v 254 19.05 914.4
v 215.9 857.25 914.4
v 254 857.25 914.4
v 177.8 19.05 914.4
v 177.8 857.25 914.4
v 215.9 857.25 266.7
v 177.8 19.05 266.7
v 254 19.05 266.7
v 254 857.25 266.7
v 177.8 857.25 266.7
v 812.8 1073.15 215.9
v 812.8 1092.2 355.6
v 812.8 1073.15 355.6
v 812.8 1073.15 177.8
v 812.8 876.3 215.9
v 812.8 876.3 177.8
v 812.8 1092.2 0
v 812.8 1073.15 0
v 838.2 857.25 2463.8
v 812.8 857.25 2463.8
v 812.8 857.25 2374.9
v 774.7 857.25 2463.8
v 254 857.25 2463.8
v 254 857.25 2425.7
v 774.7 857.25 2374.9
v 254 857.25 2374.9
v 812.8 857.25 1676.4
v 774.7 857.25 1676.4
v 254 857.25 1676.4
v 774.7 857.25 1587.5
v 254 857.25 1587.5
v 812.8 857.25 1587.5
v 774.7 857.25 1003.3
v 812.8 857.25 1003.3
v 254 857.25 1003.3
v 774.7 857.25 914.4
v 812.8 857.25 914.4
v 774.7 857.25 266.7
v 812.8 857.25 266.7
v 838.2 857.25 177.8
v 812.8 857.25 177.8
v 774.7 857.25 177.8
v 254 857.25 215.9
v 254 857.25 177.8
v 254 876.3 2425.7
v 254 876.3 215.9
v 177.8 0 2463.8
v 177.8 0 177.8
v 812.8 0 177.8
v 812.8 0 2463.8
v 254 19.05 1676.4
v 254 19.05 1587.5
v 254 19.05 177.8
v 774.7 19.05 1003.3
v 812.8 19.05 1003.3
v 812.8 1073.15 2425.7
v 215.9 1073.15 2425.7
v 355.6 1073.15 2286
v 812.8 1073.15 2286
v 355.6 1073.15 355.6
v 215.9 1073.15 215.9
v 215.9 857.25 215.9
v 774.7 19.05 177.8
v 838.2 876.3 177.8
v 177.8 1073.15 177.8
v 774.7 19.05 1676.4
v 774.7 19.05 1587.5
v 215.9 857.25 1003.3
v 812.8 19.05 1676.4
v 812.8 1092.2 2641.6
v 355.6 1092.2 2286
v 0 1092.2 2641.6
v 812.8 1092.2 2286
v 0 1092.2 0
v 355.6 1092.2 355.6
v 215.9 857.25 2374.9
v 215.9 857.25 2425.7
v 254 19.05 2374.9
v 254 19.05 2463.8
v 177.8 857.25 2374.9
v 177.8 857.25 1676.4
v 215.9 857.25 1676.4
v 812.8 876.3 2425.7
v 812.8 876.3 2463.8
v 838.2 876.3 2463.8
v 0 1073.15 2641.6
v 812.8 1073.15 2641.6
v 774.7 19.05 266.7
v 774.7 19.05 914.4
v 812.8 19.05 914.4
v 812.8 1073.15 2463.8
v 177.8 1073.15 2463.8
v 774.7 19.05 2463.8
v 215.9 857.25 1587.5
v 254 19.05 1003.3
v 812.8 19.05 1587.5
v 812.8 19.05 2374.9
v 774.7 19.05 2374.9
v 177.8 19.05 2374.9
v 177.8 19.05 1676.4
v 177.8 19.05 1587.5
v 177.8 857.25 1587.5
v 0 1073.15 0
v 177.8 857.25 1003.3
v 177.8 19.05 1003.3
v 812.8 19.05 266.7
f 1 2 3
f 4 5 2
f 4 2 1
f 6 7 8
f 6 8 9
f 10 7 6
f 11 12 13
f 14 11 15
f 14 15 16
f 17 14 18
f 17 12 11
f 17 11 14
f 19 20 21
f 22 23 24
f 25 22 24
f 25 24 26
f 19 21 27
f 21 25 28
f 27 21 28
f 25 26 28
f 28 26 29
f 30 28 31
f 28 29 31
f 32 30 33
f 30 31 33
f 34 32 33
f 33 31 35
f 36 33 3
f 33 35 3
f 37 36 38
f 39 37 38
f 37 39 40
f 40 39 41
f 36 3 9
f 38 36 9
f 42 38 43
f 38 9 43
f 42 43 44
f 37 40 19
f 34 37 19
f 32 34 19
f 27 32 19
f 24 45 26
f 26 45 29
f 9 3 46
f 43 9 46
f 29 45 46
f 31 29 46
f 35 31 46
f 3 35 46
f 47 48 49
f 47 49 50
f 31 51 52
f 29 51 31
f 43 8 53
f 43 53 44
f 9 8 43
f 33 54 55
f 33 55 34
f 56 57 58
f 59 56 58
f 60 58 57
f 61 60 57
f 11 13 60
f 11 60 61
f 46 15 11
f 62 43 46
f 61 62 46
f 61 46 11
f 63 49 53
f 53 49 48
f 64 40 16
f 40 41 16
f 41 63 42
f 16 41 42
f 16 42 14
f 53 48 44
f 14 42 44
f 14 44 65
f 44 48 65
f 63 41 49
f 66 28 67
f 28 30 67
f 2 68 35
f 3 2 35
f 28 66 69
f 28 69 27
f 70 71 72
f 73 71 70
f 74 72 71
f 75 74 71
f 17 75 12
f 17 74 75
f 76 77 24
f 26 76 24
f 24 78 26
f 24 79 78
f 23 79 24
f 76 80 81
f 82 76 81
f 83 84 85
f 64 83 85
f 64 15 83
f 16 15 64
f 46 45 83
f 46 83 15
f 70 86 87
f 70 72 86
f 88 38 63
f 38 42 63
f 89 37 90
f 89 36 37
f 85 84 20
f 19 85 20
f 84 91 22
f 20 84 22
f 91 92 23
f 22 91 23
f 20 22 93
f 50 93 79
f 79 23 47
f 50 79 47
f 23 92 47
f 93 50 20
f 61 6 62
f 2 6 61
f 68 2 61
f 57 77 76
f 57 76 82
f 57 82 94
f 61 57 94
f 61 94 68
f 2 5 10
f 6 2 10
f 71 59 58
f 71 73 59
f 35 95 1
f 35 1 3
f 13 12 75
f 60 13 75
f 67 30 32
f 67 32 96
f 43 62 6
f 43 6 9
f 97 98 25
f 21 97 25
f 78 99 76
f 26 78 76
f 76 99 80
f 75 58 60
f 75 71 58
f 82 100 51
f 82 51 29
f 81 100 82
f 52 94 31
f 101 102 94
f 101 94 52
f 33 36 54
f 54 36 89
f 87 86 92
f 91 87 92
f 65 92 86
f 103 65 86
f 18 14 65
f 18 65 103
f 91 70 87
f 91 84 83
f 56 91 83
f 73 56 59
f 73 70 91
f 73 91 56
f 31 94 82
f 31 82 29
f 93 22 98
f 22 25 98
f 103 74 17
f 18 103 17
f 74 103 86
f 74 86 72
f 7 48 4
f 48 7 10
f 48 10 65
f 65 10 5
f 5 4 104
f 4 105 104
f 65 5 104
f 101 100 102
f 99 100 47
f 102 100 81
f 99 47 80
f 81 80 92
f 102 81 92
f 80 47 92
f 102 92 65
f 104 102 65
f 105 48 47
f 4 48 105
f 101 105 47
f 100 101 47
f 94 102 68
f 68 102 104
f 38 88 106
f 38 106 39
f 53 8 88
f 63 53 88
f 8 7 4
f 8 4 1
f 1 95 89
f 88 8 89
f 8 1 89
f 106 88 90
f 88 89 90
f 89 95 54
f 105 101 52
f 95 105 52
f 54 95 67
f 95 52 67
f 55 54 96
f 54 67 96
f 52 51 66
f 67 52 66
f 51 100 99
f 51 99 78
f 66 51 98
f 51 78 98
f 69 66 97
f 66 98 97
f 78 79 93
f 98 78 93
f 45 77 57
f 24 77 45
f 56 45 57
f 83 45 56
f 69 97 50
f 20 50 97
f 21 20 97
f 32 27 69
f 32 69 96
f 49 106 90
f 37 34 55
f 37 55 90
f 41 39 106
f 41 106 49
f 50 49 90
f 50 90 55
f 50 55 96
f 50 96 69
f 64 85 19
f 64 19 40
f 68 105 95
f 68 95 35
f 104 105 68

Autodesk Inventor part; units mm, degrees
ref_plane "YZ Plane" through (0, 0, 0) normal (1, 0, 0) x (0, 1, 0)
ref_plane "XZ Plane" through (0, 0, 0) normal (0, 1, 0) x (-1, 0, 0)
ref_plane "XY Plane" through (0, 0, 0) normal (0, 0, 1) x (1, 0, 0)
sketch "Sketch1" plane through (0, 0, 0) normal (0, 0, 1) x (1, 0, 0)
  line L0 (0, 0) -> (0, 1092.2)
  line L1 (0, 1092.2) -> (812.8, 1092.2)
  line L2 (812.8, 1092.2) -> (812.8, 0)
  line L3 (812.8, 0) -> (0, 0)
  dimension "d0" = 1092.2
  dimension "d1" = 812.8
extrude "Extrusion1" add sketch "Sketch1" along normal blind 2641.6
sketch "Sketch2" plane through (812.8, 0, 0) normal (1, 0, 0) x (0, 0, -1)
  line L0 (-2641.6, 1092.2) -> (-2641.6, 0) projected
  line L1 (-2641.6, 0) -> (-2463.8, 0)
  line L2 (0, 0) -> (-2641.6, 0) projected
  line L3 (-2463.8, 0) -> (-2463.8, 1073.15)
  line L4 (-2463.8, 1073.15) -> (-2641.6, 1073.15)
  line L5 (-2641.6, 1073.15) -> (-2641.6, 0)
  line L6 (0, 1092.2) -> (0, 0) projected
  line L7 (0, 0) -> (-177.8, 0)
  line L8 (-177.8, 0) -> (-177.8, 1073.15)
  line L9 (-177.8, 1073.15) -> (0, 1073.15)
  line L10 (0, 1073.15) -> (0, 0)
  dimension "d4" = 177.8
  dimension "d5" = 1073.15
  dimension "d6" = 177.8
  dimension "d7" = 1073.15
extrude "Extrusion2" cut sketch "Sketch2" against normal blind 2641.6
sketch "Sketch3" plane through (812.8, 0, 2463.8) normal (0, 0, 1) x (1, 0, 0)
  line L0 (0, 0) -> (-812.8, 0) projected
  line L1 (-812.8, 0) -> (-635, 0)
  line L2 (-635, 0) -> (-635, 1073.15)
  line L3 (-812.8, 1073.15) -> (0, 1073.15) projected
  line L4 (-812.8, 1073.15) -> (-812.8, 0)
  line L5 (-812.8, 1092.2) -> (-812.8, 1073.15) projected
  line L6 (-635, 1073.15) -> (-812.8, 1073.15)
  dimension "d10" = 177.8
extrude "Extrusion3" cut sketch "Sketch3" against normal blind 2641.6
sketch "Sketch4" plane through (812.8, 0, 2463.8) normal (0, 0, 1) x (1, 0, 0)
  line L0 (0, 1073.15) -> (0, 0) projected
  line L1 (-635, 1073.15) -> (-635, 0) projected
  line L2 (-635, 0) -> (0, 0) projected
  line L3 (-635, 0) -> (-596.9, 0)
  line L4 (-596.9, 0) -> (-596.9, 19.05)
  line L5 (-596.9, 19.05) -> (-635, 19.05)
  line L6 (0, 0) -> (0, 1073.15) projected
  line L7 (0, 0) -> (0, 19.05)
  line L8 (0, 0) -> (-596.9, 0)
  line L9 (-596.9, 19.05) -> (-596.9, 1073.15)
  line L10 (-812.8, 1073.15) -> (0, 1073.15) projected
  line L11 (-635, 1073.15) -> (-596.9, 1073.15)
  line L12 (-635, 1073.15) -> (-635, 19.05)
  line L13 (-596.9, 19.05) -> (-558.8, 19.05)
  line L14 (-558.8, 19.05) -> (-558.8, 857.25)
  line L15 (-558.8, 857.25) -> (-596.9, 857.25)
  line L16 (-635, 0) -> (-635, 19.05)
  line L17 (-635, 19.05) -> (-25.4, 19.05)
  line L18 (-25.4, 19.05) -> (-25.4, 0)
  line L19 (-635, 0) -> (-25.4, 0)
  line L20 (-25.4, 19.05) -> (-63.5, 19.05)
  line L21 (-63.5, 19.05) -> (-63.5, 857.25)
  line L22 (-63.5, 857.25) -> (-25.4, 857.25)
  line L23 (-25.4, 857.25) -> (-25.4, 19.05)
  line L24 (-596.9, 857.25) -> (-596.9, 876.3)
  line L25 (-596.9, 876.3) -> (-25.4, 876.3)
  line L26 (-25.4, 876.3) -> (-25.4, 857.25)
  line L27 (-25.4, 857.25) -> (-596.9, 857.25)
  line L28 (-596.9, 876.3) -> (-596.9, 1092.2)
  line L29 (0, 1092.2) -> (-812.8, 1092.2) projected
  line L30 (-596.9, 1092.2) -> (0, 1092.2)
  line L31 (0, 1092.2) -> (0, 876.3)
  line L32 (-596.9, 876.3) -> (0, 876.3)
  line L33 (0, 876.3) -> (-25.4, 876.3)
  line L34 (-25.4, 876.3) -> (-25.4, 0)
  line L35 (0, 0) -> (-25.4, 0)
  line L36 (0, 0) -> (0, 876.3)
  point P0 (-812.8, 0)
  point P1 (-63.5, 857.25)
  point P2 (-25.4, 0)
  dimension "d13" = 635
  dimension "d15" = 19.05
  dimension "d16" = 38.1
  dimension "d17" = 838.2
  dimension "d18" = 609.6
  dimension "d19" = 38.1
  dimension "d20" = 838.2
  dimension "d21" = 19.05
extrude "Extrusion4" cut sketch "Sketch4" against normal blind 2641.6 contours L0 L32 L25 L9 L10 | L0 L2 L18 L23 L26 L32 | L21 L17 L14 L27
sketch "Sketch6" plane through (0, 1092.2, 0) normal (0, 1, 0) x (1, 0, 0)
  line L0 (0, 0) -> (0, -2641.6) projected
  line L1 (0, 0) -> (0, -177.8)
  line L2 (177.8, -2463.8) -> (177.8, -177.8) projected
  line L3 (0, -177.8) -> (177.8, -177.8)
  line L4 (177.8, -177.8) -> (355.6, -177.8)
  line L5 (177.8, -177.8) -> (787.4, -177.8) projected
  line L6 (177.8, -177.8) -> (177.8, 0)
  line L7 (812.8, 0) -> (0, 0) projected
  line L8 (177.8, 0) -> (812.8, 0)
  line L9 (812.8, -2641.6) -> (812.8, 0) projected
  line L10 (812.8, 0) -> (812.8, -355.6)
  line L11 (812.8, -355.6) -> (355.6, -355.6)
  line L12 (812.8, -2641.6) -> (812.8, -2286)
  line L13 (812.8, -2286) -> (355.6, -2286)
  line L14 (355.6, -2286) -> (355.6, -355.6)
  line L15 (812.8, -355.6) -> (812.8, -2286)
  dimension "d25" = 177.8
  dimension "d26" = 177.8
  dimension "d27" = 355.6
  dimension "d28" = 457.2
  dimension "d29" = 355.6
extrude "Extrusion5" cut sketch "Sketch6" against normal blind 25.4 contours L9 L13 L14 L11
sketch "Sketch7" plane through (215.9, 876.3, 2463.8) normal (0, 1, 0) x (1, 0, 0)
  line L0 (571.5, 0) -> (571.5, 2286) projected
  line L1 (0, 2286) -> (571.5, 2286)
  line L2 (571.5, 2286) -> (571.5, 2247.9)
  line L3 (0, 0) -> (0, 2286) projected
  line L4 (0, 2286) -> (0, 2247.9)
  line L5 (0, 2247.9) -> (571.5, 2247.9)
  line L6 (0, 0) -> (0, 38.1)
  line L7 (0, 38.1) -> (571.5, 38.1)
  line L8 (571.5, 0) -> (571.5, 38.1)
  line L9 (571.5, 0) -> (0, 0)
  point P0 (-215.9, 2463.8)
  point P1 (0, 38.1)
  dimension "d32" = 38.1
  dimension "d33" = 38.1
  dimension "d34" = 38.1
extrude "Extrusion6" add sketch "Sketch7" along normal blind 203.2 contours L9 L3 L7 L0 | L5 L3 L1 L0
sketch "Sketch8" plane through (177.8, 0, 177.8) normal (0, -1, 0) x (1, 0, 0)
  line L0 (609.6, 0) -> (609.6, 2286) projected
  line L1 (0, 2286) -> (0, 0) projected
  point P0 (-177.8, -177.8)
sketch "Sketch9" plane through (787.4, 0, 2463.8) normal (1, 0, 0) x (0, 0, -1)
  line L0 (38.1, 876.3) -> (2247.9, 876.3) projected
  line L1 (38.1, 876.3) -> (0, 876.3)
  line L2 (0, 1073.15) -> (0, 0) projected
  line L3 (0, 19.05) -> (0, 857.25) projected
  line L4 (0, 876.3) -> (0, 857.25)
  line L5 (0, 857.25) -> (2286, 857.25) projected
  line L6 (0, 857.25) -> (2286, 857.25)
  line L7 (2286, 857.25) -> (2286, 876.3)
  line L8 (2286, 0) -> (2286, 1073.15) projected
  line L9 (2286, 876.3) -> (0, 876.3)
  point P0 (2463.8, 0)
  dimension "d38" = 19.05
  dimension "d39" = 2286
extrude "Extrusion7" add sketch "Sketch9" along normal blind 25.4
sketch "Sketch10" plane through (215.9, 876.3, 215.9) normal (0, 1, 0) x (1, 0, 0)
  line L0 (596.9, 38.1) -> (596.9, -2247.9) projected
  line L1 (0, -2209.8) -> (0, 0) projected
  point P0 (-215.9, 215.9)
sketch "Sketch11" plane through (215.9, 876.3, 215.9) normal (1, 0, 0) x (0, 0, -1)
  line L0 (-2209.8, 0) -> (-2209.8, 196.85)
  line L1 (-2247.9, 196.85) -> (38.1, 196.85) projected
  line L2 (0, 0) -> (0, 196.85) projected
  line L3 (0, 196.85) -> (-2209.8, 196.85)
  line L4 (-2209.8, 0) -> (0, 0) projected
  line L5 (-2209.8, 0) -> (0, 0)
  line L6 (0, 0) -> (0, 196.85)
  line L7 (0, 0) -> (0, 196.85)
  point P0 (215.9, -876.3)
sketch "Sketch12" plane through (787.4, 0, 2463.8) normal (1, 0, 0) x (0, 0, -1)
  line L0 (0, 0) -> (0, 857.25) projected
  line L1 (0, 857.25) -> (2286, 857.25) projected
  line L2 (0, 0) -> (0, 857.25)
  line L3 (0, 857.25) -> (2286, 857.25)
  line L4 (2286, 857.25) -> (2286, 0) projected
  line L5 (2286, 857.25) -> (2286, 0)
  line L6 (2286, 0) -> (0, 0)
  point P0 (2463.8, 0)
extrude "Extrusion8" add sketch "Sketch12" along normal blind 25.4
sketch "Sketch13" plane through (787.4, 876.3, 2463.8) normal (1, 0, 0) x (0, 0, -1)
  line L0 (38.1, 0) -> (38.1, 196.85) projected
  line L1 (0, 196.85) -> (38.1, 196.85)
  line L2 (38.1, 196.85) -> (38.1, 0)
  line L3 (38.1, 0) -> (0, 0)
  line L4 (0, 0) -> (0, 196.85)
  point P0 (2463.8, -876.3)
extrude "Extrusion9" add sketch "Sketch13" along normal blind 25.4
sketch "Sketch14" plane through (787.4, 876.3, 177.8) normal (1, 0, 0) x (0, 0, -1)
  line L0 (-38.1, 0) -> (-38.1, 196.85) projected
  line L1 (0, 196.85) -> (0, 0) projected
  line L2 (-38.1, 196.85) -> (0, 196.85)
  line L3 (0, 196.85) -> (0, 0)
  line L4 (0, 0) -> (-38.1, 0)
  line L5 (-38.1, 0) -> (-38.1, 196.85)
  point P0 (177.8, -876.3)
extrude "Extrusion10" add sketch "Sketch14" along normal blind 25.4
sketch "Sketch15" plane through (812.8, 0, 2463.8) normal (1, 0, 0) x (0, 0, -1)
  line L0 (38.1, 876.3) -> (2247.9, 876.3) projected
  line L1 (0, 857.25) -> (2286, 857.25) projected
  line L2 (38.1, 876.3) -> (0, 876.3)
  line L3 (0, 876.3) -> (0, 857.25)
  line L4 (0, 857.25) -> (2286, 857.25)
  line L5 (2286, 0) -> (2286, 1073.15) projected
  line L6 (2286, 857.25) -> (2286, 876.3)
  line L7 (0, 876.3) -> (2286, 876.3)
  point P0 (2463.8, 0)
extrude "Extrusion11" add sketch "Sketch15" along normal blind 25.4
sketch "Sketch16" plane through (215.9, 876.3, 215.9) normal (0, 1, 0) x (1, 0, 0)
  line L0 (0, -2209.8) -> (596.9, -2209.8) projected
  line L1 (0, -2209.8) -> (38.1, -2209.8)
  point P0 (-215.9, 215.9)
  dimension "d51" = 38.1
sketch "Sketch17" plane through (215.9, 876.3, 215.9) normal (0, 1, 0) x (1, 0, 0)
  line L0 (0, -2209.8) -> (0, 0) projected
  line L1 (0, -2209.8) -> (38.1, -2209.8)
  line L2 (38.1, -2247.9) -> (38.1, 38.1) projected
  line L3 (38.1, -2209.8) -> (38.1, 0)
  line L4 (596.9, 0) -> (0, 0) projected
  line L5 (0, 0) -> (38.1, 4.2904)
  line L6 (38.1, 0) -> (0, 0)
  line L7 (0, 0) -> (0, -2209.8)
  point P0 (-215.9, 215.9)
  dimension "d52" = 38.1
extrude "Extrusion12" cut sketch "Sketch17" against normal blind 19.05 contours L0 L4 L2 L1
sketch "Sketch18" plane through (812.8, 0, 177.8) normal (0, 0, -1) x (-1, 0, 0)
  line L0 (558.8, 857.25) -> (63.5, 857.25) projected
  line L1 (63.5, 857.25) -> (38.1, 857.25)
  line L2 (38.1, 857.25) -> (38.1, 19.05)
  line L3 (38.1, 19.05) -> (63.5, 19.05)
  line L4 (63.5, 19.05) -> (63.5, 857.25) projected
  line L5 (63.5, 19.05) -> (63.5, 857.25)
  point P0 (812.8, 0)
  dimension "d58" = 25.4
  dimension "d59" = 838.2
extrude "Extrusion13" cut sketch "Sketch18" against normal blind 3810
sketch "Sketch21" plane through (254, 19.05, 2463.8) normal (1, 0, 0) x (0, 0, -1)
  line L0 (0, 0) -> (88.9, 0)
  line L1 (88.9, 0) -> (88.9, 838.2)
  line L2 (38.1, 838.2) -> (2247.9, 838.2) projected
  line L3 (88.9, 838.2) -> (0, 838.2)
  line L4 (0, 838.2) -> (0, 0)
  line L5 (88.9, 0) -> (787.4, 0)
  line L6 (0, 0) -> (2286, 0) projected
  line L7 (787.4, 0) -> (787.4, 838.2)
  line L8 (787.4, 838.2) -> (876.3, 838.2)
  line L9 (876.3, 838.2) -> (876.3, 0)
  line L10 (88.9, 838.2) -> (787.4, 838.2)
  line L11 (38.1, 838.2) -> (2247.9, 838.2) projected
  line L12 (876.3, 0) -> (1460.5, 0)
  line L13 (1460.5, 0) -> (1460.5, 838.2)
  line L14 (1460.5, 838.2) -> (1549.4, 838.2)
  line L15 (1549.4, 838.2) -> (1549.4, 0)
  line L16 (1549.4, 0) -> (1460.5, 0)
  line L17 (2286, 838.2) -> (2286, 0) projected
  line L18 (2286, 0) -> (2197.1, 0)
  line L19 (2197.1, 0) -> (2197.1, 838.2)
  line L20 (2197.1, 838.2) -> (1549.4, 838.2)
  line L21 (2197.1, 0) -> (1549.4, 0)
  line L22 (0, -19.05) -> (2286, -19.05) projected
  point P0 (2463.8, -19.05)
  point P1 (876.3, 0)
  dimension "d72" = 88.9
  dimension "d73" = 698.5
  dimension "d74" = 838.2
  dimension "d75" = 88.9
  dimension "d76" = 584.2
  dimension "d77" = 838.2
  dimension "d78" = 88.9
  dimension "d79" = 838.2
  dimension "d80" = 88.9
  dimension "d81" = 838.2
extrude "Extrusion14" cut sketch "Sketch21" along normal through all both and the other way through all contours L1 L2 L7 L5 | L9 L2 L13 L6 | L15 L2 L19 L6
sketch "Sketch22" plane through (812.8, 0, 177.8) normal (0, 0, -1) x (-1, 0, 0)
  line L0 (0, 876.3) -> (558.8, 876.3) projected
  line L1 (0, 876.3) -> (38.1, 876.3)
  point P0 (812.8, 0)
  dimension "d84" = 38.1
properties part number "bardraft"
